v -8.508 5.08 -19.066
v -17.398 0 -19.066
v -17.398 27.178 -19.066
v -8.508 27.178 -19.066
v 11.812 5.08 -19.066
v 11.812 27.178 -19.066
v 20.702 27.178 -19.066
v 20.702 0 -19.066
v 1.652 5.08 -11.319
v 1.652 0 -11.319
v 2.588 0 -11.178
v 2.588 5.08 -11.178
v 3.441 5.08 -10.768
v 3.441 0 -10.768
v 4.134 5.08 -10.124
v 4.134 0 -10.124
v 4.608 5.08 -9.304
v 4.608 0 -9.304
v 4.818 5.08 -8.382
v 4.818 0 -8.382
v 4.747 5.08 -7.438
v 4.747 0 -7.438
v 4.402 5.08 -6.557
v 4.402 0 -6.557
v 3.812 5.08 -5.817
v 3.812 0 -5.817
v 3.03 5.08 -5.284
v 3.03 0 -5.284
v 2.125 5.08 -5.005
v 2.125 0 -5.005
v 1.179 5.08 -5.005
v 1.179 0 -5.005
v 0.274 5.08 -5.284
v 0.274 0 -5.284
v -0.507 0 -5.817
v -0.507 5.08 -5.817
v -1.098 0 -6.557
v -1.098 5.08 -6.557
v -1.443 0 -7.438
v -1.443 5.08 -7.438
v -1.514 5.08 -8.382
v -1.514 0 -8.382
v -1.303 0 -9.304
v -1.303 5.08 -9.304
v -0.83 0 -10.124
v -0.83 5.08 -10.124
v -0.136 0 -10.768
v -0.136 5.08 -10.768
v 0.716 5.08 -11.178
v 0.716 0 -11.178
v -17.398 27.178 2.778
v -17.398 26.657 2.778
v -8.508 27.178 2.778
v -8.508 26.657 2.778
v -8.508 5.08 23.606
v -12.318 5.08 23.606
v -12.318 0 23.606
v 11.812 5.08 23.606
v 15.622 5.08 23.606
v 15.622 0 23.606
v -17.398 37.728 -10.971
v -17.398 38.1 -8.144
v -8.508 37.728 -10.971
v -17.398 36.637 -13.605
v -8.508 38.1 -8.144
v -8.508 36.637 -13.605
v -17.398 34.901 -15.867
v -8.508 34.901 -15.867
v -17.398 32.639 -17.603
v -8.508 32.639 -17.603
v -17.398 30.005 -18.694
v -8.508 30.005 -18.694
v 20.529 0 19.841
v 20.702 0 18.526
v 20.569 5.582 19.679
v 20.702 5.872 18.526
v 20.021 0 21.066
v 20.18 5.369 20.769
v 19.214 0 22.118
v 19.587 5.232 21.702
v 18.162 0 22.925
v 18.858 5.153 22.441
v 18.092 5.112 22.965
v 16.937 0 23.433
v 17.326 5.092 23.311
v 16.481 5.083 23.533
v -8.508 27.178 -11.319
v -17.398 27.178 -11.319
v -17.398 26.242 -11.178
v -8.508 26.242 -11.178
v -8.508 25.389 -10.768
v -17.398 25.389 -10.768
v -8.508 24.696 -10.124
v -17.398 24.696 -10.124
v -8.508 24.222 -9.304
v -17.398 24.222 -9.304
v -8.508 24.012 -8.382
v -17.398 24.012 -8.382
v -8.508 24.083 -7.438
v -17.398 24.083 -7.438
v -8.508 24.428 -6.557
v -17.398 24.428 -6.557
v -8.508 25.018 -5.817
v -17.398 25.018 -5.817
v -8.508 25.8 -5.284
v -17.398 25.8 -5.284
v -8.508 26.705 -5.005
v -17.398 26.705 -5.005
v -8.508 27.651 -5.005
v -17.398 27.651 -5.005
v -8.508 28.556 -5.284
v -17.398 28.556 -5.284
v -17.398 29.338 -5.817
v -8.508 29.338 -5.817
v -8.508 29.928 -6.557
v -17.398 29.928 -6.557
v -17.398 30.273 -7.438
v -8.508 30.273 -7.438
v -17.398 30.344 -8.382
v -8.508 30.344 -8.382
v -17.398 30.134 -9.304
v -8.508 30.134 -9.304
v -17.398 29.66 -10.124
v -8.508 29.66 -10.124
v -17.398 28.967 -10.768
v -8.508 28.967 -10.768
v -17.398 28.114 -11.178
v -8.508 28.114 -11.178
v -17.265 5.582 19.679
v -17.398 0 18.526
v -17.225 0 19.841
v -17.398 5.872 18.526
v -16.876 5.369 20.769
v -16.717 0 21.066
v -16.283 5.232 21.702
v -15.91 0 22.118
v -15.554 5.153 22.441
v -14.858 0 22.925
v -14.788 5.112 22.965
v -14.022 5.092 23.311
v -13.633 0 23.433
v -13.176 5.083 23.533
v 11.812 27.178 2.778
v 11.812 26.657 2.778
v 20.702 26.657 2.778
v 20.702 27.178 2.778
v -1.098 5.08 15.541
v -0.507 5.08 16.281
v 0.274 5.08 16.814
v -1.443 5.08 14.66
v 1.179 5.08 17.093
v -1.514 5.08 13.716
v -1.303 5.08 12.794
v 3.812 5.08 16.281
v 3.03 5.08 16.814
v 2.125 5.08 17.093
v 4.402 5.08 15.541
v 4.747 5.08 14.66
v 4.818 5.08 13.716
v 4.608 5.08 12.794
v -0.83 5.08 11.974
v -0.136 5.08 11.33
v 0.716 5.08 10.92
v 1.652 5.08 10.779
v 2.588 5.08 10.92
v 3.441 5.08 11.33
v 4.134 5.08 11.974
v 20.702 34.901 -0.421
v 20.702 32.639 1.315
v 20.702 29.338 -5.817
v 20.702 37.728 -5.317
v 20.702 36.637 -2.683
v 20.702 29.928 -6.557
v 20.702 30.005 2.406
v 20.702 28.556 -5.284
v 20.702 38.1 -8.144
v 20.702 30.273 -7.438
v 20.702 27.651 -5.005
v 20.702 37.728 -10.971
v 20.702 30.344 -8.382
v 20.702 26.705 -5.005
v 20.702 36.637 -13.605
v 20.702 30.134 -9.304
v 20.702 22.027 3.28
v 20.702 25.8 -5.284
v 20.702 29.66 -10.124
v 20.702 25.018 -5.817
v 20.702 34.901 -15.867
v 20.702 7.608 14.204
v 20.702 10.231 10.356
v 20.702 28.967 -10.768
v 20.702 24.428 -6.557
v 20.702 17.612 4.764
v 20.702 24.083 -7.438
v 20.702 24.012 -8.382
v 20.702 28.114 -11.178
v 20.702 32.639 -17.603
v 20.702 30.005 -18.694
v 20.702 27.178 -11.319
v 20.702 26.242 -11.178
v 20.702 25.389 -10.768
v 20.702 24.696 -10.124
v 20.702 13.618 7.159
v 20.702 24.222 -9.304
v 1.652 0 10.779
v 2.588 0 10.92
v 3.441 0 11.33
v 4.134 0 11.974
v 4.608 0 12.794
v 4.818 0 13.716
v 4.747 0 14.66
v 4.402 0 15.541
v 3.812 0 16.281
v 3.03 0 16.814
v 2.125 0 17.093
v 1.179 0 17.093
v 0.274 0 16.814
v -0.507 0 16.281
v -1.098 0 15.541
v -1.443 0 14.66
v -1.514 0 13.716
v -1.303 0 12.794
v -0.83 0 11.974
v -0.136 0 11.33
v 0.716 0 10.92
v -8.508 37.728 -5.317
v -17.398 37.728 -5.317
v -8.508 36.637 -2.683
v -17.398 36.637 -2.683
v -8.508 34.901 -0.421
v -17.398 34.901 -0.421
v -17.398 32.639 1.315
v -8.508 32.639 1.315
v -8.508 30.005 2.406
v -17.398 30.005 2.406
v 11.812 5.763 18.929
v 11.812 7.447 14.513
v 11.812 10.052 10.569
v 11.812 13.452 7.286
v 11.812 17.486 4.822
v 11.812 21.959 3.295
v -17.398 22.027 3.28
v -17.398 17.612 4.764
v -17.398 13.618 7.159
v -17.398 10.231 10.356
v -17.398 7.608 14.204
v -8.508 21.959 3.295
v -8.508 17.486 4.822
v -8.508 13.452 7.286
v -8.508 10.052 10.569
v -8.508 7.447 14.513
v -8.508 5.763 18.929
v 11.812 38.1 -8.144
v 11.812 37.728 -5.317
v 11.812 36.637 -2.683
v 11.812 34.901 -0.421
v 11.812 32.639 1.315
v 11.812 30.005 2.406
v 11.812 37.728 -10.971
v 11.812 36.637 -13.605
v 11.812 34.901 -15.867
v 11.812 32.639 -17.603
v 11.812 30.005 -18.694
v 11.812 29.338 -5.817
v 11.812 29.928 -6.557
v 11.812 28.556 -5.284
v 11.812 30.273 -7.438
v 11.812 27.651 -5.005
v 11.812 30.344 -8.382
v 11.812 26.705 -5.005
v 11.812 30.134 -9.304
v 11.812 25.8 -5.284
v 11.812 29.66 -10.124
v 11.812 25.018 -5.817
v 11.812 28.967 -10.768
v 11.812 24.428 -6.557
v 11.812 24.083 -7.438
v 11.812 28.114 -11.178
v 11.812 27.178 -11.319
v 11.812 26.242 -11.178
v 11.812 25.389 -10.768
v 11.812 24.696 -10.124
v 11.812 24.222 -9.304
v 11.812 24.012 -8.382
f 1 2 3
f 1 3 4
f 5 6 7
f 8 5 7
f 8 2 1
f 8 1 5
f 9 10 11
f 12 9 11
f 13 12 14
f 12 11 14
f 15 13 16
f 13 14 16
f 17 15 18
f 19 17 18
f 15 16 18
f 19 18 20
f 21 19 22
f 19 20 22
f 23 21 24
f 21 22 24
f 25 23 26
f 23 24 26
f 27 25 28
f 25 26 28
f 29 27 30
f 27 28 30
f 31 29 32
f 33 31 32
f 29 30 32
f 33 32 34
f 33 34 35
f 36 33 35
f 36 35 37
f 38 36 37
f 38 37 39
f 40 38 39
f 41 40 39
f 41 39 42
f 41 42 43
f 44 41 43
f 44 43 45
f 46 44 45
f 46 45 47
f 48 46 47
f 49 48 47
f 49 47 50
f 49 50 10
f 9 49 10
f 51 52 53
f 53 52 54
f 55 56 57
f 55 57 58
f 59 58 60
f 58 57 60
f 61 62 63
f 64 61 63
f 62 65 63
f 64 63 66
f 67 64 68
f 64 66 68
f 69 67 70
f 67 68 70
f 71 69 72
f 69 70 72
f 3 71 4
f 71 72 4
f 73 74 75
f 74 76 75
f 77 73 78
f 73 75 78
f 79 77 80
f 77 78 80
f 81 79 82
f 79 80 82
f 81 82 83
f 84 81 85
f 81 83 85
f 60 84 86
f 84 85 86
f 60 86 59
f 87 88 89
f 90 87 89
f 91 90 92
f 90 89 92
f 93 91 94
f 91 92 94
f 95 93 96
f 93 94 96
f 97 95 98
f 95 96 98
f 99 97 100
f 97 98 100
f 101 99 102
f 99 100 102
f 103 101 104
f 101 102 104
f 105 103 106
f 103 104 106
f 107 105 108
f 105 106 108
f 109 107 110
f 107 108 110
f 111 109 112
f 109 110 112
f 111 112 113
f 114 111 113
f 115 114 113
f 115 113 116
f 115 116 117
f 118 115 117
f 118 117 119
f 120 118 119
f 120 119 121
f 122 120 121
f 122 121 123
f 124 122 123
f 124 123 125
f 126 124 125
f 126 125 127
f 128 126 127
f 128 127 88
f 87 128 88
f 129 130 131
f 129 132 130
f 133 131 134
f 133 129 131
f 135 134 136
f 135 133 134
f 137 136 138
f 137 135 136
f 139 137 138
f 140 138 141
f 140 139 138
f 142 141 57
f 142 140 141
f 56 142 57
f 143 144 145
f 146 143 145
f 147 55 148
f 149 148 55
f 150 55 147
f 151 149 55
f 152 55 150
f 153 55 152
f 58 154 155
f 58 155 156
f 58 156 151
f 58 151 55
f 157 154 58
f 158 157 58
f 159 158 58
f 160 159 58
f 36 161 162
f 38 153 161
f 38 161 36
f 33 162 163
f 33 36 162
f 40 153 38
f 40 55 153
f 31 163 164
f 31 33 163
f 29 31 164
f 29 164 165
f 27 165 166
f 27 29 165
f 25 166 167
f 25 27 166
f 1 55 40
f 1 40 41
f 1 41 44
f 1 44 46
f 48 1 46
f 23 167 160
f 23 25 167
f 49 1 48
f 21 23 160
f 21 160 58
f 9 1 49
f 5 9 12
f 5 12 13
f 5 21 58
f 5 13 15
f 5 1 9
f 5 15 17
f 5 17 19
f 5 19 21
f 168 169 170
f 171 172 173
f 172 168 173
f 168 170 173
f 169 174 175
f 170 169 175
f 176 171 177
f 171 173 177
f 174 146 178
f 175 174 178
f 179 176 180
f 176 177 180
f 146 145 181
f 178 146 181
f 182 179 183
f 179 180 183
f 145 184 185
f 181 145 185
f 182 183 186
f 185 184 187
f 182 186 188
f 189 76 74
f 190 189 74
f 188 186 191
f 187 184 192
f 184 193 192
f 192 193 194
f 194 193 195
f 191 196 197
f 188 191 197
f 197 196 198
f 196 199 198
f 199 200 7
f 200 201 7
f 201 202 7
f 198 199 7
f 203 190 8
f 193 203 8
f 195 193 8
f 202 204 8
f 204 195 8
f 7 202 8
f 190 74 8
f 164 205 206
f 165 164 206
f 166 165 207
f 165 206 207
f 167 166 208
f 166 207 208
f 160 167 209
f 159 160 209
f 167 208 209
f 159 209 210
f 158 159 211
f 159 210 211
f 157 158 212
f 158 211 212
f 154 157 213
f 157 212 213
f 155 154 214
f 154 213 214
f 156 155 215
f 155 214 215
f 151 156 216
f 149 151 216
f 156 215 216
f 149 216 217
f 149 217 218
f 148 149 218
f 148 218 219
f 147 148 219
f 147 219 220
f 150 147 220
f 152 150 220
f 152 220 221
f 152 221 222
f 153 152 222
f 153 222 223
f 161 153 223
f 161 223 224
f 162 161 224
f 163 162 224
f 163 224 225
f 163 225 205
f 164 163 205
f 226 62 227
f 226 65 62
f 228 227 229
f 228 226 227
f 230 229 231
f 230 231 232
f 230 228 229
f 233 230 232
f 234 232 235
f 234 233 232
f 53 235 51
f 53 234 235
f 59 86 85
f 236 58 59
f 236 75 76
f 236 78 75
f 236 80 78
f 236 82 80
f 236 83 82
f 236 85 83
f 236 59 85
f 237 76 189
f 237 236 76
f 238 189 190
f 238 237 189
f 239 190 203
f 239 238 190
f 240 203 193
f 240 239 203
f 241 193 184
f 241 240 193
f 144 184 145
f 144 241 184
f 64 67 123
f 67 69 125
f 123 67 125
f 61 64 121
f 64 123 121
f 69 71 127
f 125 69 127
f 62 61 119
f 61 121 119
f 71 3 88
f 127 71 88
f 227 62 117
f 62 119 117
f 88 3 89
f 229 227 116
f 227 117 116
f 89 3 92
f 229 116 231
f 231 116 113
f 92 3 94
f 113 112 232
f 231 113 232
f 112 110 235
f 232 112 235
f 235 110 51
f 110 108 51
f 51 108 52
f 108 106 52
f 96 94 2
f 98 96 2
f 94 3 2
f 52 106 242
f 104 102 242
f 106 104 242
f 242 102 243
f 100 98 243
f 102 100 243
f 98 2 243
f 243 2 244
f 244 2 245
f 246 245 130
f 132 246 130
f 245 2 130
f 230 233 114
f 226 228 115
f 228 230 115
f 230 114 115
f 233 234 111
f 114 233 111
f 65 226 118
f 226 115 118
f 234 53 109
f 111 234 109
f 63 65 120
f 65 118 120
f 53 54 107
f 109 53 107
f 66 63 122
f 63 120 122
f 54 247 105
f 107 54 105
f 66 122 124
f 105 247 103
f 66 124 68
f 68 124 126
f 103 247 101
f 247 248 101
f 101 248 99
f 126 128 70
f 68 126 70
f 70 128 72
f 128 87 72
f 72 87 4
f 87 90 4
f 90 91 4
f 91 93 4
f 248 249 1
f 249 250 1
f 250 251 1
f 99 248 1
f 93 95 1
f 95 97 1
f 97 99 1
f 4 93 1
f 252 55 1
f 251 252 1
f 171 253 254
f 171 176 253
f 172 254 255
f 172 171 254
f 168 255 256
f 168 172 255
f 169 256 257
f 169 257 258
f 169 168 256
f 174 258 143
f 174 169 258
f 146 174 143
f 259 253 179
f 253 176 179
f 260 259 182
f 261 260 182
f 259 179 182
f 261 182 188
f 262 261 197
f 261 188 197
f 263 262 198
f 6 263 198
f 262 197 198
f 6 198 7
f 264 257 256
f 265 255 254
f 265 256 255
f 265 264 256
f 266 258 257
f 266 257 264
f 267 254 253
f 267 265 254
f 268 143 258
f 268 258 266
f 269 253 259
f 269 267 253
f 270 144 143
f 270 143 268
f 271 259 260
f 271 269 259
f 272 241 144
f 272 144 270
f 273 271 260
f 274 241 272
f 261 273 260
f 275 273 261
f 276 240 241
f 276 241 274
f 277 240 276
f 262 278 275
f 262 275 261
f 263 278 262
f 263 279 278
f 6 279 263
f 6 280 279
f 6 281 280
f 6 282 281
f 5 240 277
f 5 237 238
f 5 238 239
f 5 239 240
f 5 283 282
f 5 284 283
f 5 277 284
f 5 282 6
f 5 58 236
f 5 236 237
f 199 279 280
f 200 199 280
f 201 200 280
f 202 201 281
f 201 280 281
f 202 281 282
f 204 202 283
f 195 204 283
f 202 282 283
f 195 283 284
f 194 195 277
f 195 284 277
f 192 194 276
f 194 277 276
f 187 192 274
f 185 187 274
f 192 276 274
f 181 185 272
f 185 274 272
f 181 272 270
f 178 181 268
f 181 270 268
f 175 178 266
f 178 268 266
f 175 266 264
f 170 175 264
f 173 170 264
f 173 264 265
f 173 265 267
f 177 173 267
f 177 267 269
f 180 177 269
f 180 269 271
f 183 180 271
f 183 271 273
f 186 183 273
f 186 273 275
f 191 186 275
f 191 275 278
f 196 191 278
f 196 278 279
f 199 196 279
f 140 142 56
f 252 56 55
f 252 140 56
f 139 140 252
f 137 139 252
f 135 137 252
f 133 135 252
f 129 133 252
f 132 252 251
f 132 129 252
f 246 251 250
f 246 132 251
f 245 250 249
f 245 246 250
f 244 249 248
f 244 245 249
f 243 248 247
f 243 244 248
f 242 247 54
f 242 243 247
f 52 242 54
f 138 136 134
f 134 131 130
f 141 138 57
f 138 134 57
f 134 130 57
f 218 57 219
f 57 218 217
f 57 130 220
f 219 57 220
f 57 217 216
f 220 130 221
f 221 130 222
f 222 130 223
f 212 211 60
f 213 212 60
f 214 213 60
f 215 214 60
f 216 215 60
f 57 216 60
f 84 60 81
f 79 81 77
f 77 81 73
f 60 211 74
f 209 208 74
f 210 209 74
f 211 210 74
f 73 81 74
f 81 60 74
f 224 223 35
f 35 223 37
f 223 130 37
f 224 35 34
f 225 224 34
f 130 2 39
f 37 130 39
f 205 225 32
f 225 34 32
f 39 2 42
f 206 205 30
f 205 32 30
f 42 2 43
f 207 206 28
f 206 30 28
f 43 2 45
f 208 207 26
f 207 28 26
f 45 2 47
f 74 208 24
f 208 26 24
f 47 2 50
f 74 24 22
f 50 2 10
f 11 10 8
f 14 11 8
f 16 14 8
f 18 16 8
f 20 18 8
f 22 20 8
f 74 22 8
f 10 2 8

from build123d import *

# Parameters (mm, degrees)
SKETCH1_W                            = 38.1
SKETCH1_H                            = 42.672
BOSS_EXTRUDE1_DEPTH                  = 5.08
SKETCH2_W                            = 8.89
SKETCH2_H                            = 21.844
BOSS_EXTRUDE2_DEPTH                  = 33.02
FILLET1_R                            = 10.922
FILLET2_R                            = 21.59
FILLET3_R                            = 5.08
F_1_1_DIAMETER_HOLE1_D               = 6.35
F_1_1_DIAMETER_HOLE1_DEPTH           = 50.8
F_1_1_DIAMETER_HOLE1_TIP             = 1.907732465
F_1_1_DIAMETER_HOLE1_ON_FACE_2_D     = 6.35
F_1_1_DIAMETER_HOLE1_ON_FACE_2_DEPTH = 50.8
F_1_1_DIAMETER_HOLE1_ON_FACE_2_TIP   = 1.907732465


# Some blends are built 0.0001 mm under size
with BuildPart() as part:
    # Sketch1 → Boss-Extrude1 (new body)
    with BuildSketch(Plane(origin=(0, 0, 0), x_dir=(1, 0, 0), z_dir=(0, 1, 0))):
        with Locations((1.652063174, -2.269767862)):
            Rectangle(SKETCH1_W, SKETCH1_H)
    extrude(amount=BOSS_EXTRUDE1_DEPTH)

    # Sketch2 → Boss-Extrude2 (add)
    with BuildSketch(Plane(origin=(0, 5.08, 0), x_dir=(1, 0, 0), z_dir=(0, 1, 0))):
        with Locations((16.257063174, 8.144232138)):
            Rectangle(SKETCH2_W, SKETCH2_H)
        with Locations((-12.952936826, 8.144232138)):
            Rectangle(SKETCH2_W, SKETCH2_H)
    extrude(amount=BOSS_EXTRUDE2_DEPTH)

    # Fillet1
    fillet1_edges = [part.edges().sort_by_distance(p)[0] for p in [
        (-12.952936826, 38.1, -19.066232138),
        (16.257063174, 38.1, -19.066232138),
        (16.257063174, 38.1, 2.777767862),
        (-12.952936826, 38.1, 2.777767862),
    ]]
    fillet(fillet1_edges, radius=FILLET1_R - 0.0001)  # a hair under: the kernel refuses the full size

    # Fillet2
    # the kernel refuses this fillet: 21.59 mm, written as the material it adds along each edge
    with BuildSketch(Plane(origin=(-42.129308703, 5.08, 2.777767862), x_dir=(0, 0, 1), z_dir=(1, 0, 0))) as fillet2_piece_1_section:
        with BuildLine():
            CenterArc((21.59, -21.576548751), FILLET2_R, 92.022624053, 87.977375947)
            Line((0, -21.576548751), (-0.4318, -21.576548751))
            Line((-0.4318, -21.576548751), (-0.4318, 0))
            Line((-0.4318, 0), (0, 0.4318))
            ThreePointArc((0, 0.4318), (10.414, 0.4318), (20.81276, 0.431530975))
            Line((20.81276, 0.431530975), (20.828, 0))
        make_face()
    fillet2_piece_1 = extrude(amount=62.831371877, mode=Mode.PRIVATE)
    fillet2_piece_1 = split(fillet2_piece_1, bisect_by=Plane(origin=(-17.397936826, 9.985892861, 7.610379984), z_dir=(1, 0, 0)), keep=Keep.TOP, mode=Mode.PRIVATE)
    fillet2_piece_1 = split(fillet2_piece_1, bisect_by=Plane(origin=(-8.507936826, 9.985892861, 7.610379984), z_dir=(-1, 0, 0)), keep=Keep.TOP, mode=Mode.PRIVATE)
    add(fillet2_piece_1)
    with BuildSketch(Plane(origin=(11.812063174, 5.08, 2.777767862), x_dir=(0, 0, 1), z_dir=(1, 0, 0))) as fillet2_piece_2:
        with BuildLine():
            CenterArc((21.59, -21.576548751), FILLET2_R, 92.022624053, 87.977375947)
            Line((0, -21.576548751), (-0.4318, -21.576548751))
            Line((-0.4318, -21.576548751), (-0.4318, 0))
            Line((-0.4318, 0), (0, 0.4318))
            ThreePointArc((0, 0.4318), (10.414, 0.4318), (20.81276, 0.431530975))
            Line((20.81276, 0.431530975), (20.828, 0))
        make_face()
    extrude(amount=8.89)
    with BuildSketch(Plane(origin=(45.433435051, 5.08, 2.777767862), x_dir=(0, 0, 1), z_dir=(-1, 0, 0))) as fillet2_piece_3_section:
        with BuildLine():
            CenterArc((21.59, 21.576548751), FILLET2_R, 180, 87.977375947)
            Line((0, 21.576548751), (-0.4318, 21.576548751))
            Line((-0.4318, 21.576548751), (-0.4318, 0))
            Line((-0.4318, 0), (0, -0.4318))
            ThreePointArc((0, -0.4318), (10.414, -0.4318), (20.81276, -0.431530975))
            Line((20.81276, -0.431530975), (20.828, 0))
        make_face()
    fillet2_piece_3 = extrude(amount=62.831371877, mode=Mode.PRIVATE)
    fillet2_piece_3 = split(fillet2_piece_3, bisect_by=Plane(origin=(20.702063174, 9.985892861, 7.610379984), z_dir=(-1, 0, 0)), keep=Keep.TOP, mode=Mode.PRIVATE)
    fillet2_piece_3 = split(fillet2_piece_3, bisect_by=Plane(origin=(11.812063174, 9.985892861, 7.610379984), z_dir=(1, 0, 0)), keep=Keep.TOP, mode=Mode.PRIVATE)
    add(fillet2_piece_3)
    with BuildSketch(Plane(origin=(-8.507936826, 5.08, 2.777767862), x_dir=(0, 0, 1), z_dir=(-1, 0, 0))) as fillet2_piece_4:
        with BuildLine():
            CenterArc((21.59, 21.576548751), FILLET2_R, 180, 87.977375947)
            Line((0, 21.576548751), (-0.4318, 21.576548751))
            Line((-0.4318, 21.576548751), (-0.4318, 0))
            Line((-0.4318, 0), (0, -0.4318))
            ThreePointArc((0, -0.4318), (10.414, -0.4318), (20.81276, -0.431530975))
            Line((20.81276, -0.431530975), (20.828, 0))
        make_face()
    extrude(amount=8.89)

    # Fillet3
    fillet3_edges = [part.edges().sort_by_distance(p)[0] for p in [
        (20.702063174, 2.54, 23.605767862),
        (-17.397936826, 2.54, 23.605767862),
    ]]
    fillet(fillet3_edges, radius=FILLET3_R)

    # 1 (1) Diameter Hole1
    with Locations(Plane(origin=(1.652063174, 5.08, 13.953767862), x_dir=(0, 0, 1), z_dir=(0, 1, 0))):
        with Locations((0, 0), (-22.098, 0)):
            Hole(F_1_1_DIAMETER_HOLE1_D / 2, depth=F_1_1_DIAMETER_HOLE1_DEPTH)
            with Locations((0, 0, -(F_1_1_DIAMETER_HOLE1_DEPTH + F_1_1_DIAMETER_HOLE1_TIP / 2))):  # 118° drill point
                Cone(0, F_1_1_DIAMETER_HOLE1_D / 2, F_1_1_DIAMETER_HOLE1_TIP, mode=Mode.SUBTRACT)

    # 1 (1) Diameter Hole1 on face 2
    with Locations(Plane(origin=(20.702063174, 27.178, -8.144232138), x_dir=(0, 0, 1), z_dir=(1, 0, 0))):
        with Locations((0, 0)):
            Hole(F_1_1_DIAMETER_HOLE1_ON_FACE_2_D / 2, depth=F_1_1_DIAMETER_HOLE1_ON_FACE_2_DEPTH)
            with Locations((0, 0, -(F_1_1_DIAMETER_HOLE1_ON_FACE_2_DEPTH + F_1_1_DIAMETER_HOLE1_ON_FACE_2_TIP / 2))):  # 118° drill point
                Cone(0, F_1_1_DIAMETER_HOLE1_ON_FACE_2_D / 2, F_1_1_DIAMETER_HOLE1_ON_FACE_2_TIP, mode=Mode.SUBTRACT)


solid = part.part
